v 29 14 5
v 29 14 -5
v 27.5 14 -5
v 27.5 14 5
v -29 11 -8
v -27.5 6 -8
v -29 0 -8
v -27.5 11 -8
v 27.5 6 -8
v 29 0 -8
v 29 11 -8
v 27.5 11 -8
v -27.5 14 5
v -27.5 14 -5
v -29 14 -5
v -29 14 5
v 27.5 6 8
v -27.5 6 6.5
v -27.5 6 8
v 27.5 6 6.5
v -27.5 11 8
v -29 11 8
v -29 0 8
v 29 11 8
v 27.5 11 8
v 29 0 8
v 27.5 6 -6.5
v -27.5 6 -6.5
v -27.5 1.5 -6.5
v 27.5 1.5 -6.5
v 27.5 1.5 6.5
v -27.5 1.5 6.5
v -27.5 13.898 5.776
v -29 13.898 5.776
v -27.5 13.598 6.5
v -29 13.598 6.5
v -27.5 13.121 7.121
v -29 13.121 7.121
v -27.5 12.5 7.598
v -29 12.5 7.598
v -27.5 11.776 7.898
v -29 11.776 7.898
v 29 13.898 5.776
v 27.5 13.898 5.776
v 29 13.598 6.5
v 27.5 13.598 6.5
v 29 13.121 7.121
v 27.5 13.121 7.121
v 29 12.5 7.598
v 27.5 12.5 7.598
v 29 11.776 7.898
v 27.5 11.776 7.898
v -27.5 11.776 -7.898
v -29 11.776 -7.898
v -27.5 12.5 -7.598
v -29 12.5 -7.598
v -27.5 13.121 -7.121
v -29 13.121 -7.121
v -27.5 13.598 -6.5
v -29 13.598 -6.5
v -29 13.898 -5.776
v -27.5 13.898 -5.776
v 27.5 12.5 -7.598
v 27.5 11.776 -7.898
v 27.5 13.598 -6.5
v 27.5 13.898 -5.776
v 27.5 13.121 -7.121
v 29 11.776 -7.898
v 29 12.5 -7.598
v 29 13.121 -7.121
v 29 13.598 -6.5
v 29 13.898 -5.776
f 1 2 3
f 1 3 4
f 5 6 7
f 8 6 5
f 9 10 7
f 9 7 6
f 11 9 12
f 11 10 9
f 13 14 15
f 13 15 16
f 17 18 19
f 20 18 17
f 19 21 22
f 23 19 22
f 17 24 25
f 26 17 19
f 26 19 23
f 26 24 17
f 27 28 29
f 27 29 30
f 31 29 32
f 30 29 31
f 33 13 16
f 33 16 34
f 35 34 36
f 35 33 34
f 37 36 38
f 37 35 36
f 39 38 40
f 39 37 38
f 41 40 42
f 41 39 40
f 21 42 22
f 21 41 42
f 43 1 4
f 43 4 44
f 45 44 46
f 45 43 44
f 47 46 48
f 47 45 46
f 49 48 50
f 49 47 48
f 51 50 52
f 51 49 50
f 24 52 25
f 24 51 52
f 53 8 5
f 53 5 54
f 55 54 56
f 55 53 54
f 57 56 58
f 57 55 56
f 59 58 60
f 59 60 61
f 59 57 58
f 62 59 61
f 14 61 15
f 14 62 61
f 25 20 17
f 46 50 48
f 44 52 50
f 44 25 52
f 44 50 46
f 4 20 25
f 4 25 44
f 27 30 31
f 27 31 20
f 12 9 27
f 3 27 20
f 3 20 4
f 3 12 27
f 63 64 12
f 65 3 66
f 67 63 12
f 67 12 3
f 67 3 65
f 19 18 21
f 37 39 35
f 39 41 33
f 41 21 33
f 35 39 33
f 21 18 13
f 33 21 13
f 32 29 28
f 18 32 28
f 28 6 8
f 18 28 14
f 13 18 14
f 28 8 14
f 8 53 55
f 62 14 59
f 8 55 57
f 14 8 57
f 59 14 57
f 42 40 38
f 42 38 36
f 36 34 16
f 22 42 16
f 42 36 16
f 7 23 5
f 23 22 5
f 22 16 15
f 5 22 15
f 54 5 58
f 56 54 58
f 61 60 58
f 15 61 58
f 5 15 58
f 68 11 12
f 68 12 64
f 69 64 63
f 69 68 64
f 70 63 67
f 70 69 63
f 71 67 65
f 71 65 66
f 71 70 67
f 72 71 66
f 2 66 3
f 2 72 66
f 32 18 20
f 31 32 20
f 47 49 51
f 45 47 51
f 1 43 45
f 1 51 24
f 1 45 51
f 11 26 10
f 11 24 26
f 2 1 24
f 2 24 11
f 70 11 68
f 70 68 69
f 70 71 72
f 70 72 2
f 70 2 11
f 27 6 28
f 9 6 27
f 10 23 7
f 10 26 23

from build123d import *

# Parameters (mm, degrees)
BOSS_EXTRUDE1_DEPTH     = 29
CUT_EXTRUDE1_DEPTH      = 34.181320046
CUT_EXTRUDE1_DEPTH_BACK = 34.181320046
SKETCH4_W               = 55
SKETCH4_H               = 16
SKETCH5_W               = 55
SKETCH5_H               = 13
CUT_EXTRUDE2_DEPTH      = 4.5


with BuildPart() as part:
    # Sketch3 → Boss-Extrude1 (new, symmetric)
    with BuildSketch(Plane(origin=(0, 0, 0), x_dir=(0, 0, -1), z_dir=(1, 0, 0))):
        with BuildLine():
            Line((-8, 0), (8, 0))
            Line((8, 0), (8, 11))
            ThreePointArc((8, 11), (7.121320344, 13.121320344), (5, 14))
            Line((5, 14), (-5, 14))
            ThreePointArc((-5, 14), (-7.121320344, 13.121320344), (-8, 11))
            Line((-8, 11), (-8, 0))
        make_face()
    extrude(amount=BOSS_EXTRUDE1_DEPTH, both=True)

    # Sketch4 → Cut-Extrude1 (cut, two sides: drawn at the far end of the back side and taken through both)
    with BuildSketch(Plane.XY.offset(-CUT_EXTRUDE1_DEPTH_BACK)):
        with Locations((0, 14)):
            Rectangle(SKETCH4_W, SKETCH4_H)
    extrude(amount=CUT_EXTRUDE1_DEPTH + CUT_EXTRUDE1_DEPTH_BACK, mode=Mode.SUBTRACT)

    # Sketch5 → Cut-Extrude2 (cut)
    with BuildSketch(Plane(origin=(0, 6, 0), x_dir=(1, 0, 0), z_dir=(0, 1, 0))):
        Rectangle(SKETCH5_W, SKETCH5_H)
    extrude(amount=-CUT_EXTRUDE2_DEPTH, mode=Mode.SUBTRACT)


solid = part.part
